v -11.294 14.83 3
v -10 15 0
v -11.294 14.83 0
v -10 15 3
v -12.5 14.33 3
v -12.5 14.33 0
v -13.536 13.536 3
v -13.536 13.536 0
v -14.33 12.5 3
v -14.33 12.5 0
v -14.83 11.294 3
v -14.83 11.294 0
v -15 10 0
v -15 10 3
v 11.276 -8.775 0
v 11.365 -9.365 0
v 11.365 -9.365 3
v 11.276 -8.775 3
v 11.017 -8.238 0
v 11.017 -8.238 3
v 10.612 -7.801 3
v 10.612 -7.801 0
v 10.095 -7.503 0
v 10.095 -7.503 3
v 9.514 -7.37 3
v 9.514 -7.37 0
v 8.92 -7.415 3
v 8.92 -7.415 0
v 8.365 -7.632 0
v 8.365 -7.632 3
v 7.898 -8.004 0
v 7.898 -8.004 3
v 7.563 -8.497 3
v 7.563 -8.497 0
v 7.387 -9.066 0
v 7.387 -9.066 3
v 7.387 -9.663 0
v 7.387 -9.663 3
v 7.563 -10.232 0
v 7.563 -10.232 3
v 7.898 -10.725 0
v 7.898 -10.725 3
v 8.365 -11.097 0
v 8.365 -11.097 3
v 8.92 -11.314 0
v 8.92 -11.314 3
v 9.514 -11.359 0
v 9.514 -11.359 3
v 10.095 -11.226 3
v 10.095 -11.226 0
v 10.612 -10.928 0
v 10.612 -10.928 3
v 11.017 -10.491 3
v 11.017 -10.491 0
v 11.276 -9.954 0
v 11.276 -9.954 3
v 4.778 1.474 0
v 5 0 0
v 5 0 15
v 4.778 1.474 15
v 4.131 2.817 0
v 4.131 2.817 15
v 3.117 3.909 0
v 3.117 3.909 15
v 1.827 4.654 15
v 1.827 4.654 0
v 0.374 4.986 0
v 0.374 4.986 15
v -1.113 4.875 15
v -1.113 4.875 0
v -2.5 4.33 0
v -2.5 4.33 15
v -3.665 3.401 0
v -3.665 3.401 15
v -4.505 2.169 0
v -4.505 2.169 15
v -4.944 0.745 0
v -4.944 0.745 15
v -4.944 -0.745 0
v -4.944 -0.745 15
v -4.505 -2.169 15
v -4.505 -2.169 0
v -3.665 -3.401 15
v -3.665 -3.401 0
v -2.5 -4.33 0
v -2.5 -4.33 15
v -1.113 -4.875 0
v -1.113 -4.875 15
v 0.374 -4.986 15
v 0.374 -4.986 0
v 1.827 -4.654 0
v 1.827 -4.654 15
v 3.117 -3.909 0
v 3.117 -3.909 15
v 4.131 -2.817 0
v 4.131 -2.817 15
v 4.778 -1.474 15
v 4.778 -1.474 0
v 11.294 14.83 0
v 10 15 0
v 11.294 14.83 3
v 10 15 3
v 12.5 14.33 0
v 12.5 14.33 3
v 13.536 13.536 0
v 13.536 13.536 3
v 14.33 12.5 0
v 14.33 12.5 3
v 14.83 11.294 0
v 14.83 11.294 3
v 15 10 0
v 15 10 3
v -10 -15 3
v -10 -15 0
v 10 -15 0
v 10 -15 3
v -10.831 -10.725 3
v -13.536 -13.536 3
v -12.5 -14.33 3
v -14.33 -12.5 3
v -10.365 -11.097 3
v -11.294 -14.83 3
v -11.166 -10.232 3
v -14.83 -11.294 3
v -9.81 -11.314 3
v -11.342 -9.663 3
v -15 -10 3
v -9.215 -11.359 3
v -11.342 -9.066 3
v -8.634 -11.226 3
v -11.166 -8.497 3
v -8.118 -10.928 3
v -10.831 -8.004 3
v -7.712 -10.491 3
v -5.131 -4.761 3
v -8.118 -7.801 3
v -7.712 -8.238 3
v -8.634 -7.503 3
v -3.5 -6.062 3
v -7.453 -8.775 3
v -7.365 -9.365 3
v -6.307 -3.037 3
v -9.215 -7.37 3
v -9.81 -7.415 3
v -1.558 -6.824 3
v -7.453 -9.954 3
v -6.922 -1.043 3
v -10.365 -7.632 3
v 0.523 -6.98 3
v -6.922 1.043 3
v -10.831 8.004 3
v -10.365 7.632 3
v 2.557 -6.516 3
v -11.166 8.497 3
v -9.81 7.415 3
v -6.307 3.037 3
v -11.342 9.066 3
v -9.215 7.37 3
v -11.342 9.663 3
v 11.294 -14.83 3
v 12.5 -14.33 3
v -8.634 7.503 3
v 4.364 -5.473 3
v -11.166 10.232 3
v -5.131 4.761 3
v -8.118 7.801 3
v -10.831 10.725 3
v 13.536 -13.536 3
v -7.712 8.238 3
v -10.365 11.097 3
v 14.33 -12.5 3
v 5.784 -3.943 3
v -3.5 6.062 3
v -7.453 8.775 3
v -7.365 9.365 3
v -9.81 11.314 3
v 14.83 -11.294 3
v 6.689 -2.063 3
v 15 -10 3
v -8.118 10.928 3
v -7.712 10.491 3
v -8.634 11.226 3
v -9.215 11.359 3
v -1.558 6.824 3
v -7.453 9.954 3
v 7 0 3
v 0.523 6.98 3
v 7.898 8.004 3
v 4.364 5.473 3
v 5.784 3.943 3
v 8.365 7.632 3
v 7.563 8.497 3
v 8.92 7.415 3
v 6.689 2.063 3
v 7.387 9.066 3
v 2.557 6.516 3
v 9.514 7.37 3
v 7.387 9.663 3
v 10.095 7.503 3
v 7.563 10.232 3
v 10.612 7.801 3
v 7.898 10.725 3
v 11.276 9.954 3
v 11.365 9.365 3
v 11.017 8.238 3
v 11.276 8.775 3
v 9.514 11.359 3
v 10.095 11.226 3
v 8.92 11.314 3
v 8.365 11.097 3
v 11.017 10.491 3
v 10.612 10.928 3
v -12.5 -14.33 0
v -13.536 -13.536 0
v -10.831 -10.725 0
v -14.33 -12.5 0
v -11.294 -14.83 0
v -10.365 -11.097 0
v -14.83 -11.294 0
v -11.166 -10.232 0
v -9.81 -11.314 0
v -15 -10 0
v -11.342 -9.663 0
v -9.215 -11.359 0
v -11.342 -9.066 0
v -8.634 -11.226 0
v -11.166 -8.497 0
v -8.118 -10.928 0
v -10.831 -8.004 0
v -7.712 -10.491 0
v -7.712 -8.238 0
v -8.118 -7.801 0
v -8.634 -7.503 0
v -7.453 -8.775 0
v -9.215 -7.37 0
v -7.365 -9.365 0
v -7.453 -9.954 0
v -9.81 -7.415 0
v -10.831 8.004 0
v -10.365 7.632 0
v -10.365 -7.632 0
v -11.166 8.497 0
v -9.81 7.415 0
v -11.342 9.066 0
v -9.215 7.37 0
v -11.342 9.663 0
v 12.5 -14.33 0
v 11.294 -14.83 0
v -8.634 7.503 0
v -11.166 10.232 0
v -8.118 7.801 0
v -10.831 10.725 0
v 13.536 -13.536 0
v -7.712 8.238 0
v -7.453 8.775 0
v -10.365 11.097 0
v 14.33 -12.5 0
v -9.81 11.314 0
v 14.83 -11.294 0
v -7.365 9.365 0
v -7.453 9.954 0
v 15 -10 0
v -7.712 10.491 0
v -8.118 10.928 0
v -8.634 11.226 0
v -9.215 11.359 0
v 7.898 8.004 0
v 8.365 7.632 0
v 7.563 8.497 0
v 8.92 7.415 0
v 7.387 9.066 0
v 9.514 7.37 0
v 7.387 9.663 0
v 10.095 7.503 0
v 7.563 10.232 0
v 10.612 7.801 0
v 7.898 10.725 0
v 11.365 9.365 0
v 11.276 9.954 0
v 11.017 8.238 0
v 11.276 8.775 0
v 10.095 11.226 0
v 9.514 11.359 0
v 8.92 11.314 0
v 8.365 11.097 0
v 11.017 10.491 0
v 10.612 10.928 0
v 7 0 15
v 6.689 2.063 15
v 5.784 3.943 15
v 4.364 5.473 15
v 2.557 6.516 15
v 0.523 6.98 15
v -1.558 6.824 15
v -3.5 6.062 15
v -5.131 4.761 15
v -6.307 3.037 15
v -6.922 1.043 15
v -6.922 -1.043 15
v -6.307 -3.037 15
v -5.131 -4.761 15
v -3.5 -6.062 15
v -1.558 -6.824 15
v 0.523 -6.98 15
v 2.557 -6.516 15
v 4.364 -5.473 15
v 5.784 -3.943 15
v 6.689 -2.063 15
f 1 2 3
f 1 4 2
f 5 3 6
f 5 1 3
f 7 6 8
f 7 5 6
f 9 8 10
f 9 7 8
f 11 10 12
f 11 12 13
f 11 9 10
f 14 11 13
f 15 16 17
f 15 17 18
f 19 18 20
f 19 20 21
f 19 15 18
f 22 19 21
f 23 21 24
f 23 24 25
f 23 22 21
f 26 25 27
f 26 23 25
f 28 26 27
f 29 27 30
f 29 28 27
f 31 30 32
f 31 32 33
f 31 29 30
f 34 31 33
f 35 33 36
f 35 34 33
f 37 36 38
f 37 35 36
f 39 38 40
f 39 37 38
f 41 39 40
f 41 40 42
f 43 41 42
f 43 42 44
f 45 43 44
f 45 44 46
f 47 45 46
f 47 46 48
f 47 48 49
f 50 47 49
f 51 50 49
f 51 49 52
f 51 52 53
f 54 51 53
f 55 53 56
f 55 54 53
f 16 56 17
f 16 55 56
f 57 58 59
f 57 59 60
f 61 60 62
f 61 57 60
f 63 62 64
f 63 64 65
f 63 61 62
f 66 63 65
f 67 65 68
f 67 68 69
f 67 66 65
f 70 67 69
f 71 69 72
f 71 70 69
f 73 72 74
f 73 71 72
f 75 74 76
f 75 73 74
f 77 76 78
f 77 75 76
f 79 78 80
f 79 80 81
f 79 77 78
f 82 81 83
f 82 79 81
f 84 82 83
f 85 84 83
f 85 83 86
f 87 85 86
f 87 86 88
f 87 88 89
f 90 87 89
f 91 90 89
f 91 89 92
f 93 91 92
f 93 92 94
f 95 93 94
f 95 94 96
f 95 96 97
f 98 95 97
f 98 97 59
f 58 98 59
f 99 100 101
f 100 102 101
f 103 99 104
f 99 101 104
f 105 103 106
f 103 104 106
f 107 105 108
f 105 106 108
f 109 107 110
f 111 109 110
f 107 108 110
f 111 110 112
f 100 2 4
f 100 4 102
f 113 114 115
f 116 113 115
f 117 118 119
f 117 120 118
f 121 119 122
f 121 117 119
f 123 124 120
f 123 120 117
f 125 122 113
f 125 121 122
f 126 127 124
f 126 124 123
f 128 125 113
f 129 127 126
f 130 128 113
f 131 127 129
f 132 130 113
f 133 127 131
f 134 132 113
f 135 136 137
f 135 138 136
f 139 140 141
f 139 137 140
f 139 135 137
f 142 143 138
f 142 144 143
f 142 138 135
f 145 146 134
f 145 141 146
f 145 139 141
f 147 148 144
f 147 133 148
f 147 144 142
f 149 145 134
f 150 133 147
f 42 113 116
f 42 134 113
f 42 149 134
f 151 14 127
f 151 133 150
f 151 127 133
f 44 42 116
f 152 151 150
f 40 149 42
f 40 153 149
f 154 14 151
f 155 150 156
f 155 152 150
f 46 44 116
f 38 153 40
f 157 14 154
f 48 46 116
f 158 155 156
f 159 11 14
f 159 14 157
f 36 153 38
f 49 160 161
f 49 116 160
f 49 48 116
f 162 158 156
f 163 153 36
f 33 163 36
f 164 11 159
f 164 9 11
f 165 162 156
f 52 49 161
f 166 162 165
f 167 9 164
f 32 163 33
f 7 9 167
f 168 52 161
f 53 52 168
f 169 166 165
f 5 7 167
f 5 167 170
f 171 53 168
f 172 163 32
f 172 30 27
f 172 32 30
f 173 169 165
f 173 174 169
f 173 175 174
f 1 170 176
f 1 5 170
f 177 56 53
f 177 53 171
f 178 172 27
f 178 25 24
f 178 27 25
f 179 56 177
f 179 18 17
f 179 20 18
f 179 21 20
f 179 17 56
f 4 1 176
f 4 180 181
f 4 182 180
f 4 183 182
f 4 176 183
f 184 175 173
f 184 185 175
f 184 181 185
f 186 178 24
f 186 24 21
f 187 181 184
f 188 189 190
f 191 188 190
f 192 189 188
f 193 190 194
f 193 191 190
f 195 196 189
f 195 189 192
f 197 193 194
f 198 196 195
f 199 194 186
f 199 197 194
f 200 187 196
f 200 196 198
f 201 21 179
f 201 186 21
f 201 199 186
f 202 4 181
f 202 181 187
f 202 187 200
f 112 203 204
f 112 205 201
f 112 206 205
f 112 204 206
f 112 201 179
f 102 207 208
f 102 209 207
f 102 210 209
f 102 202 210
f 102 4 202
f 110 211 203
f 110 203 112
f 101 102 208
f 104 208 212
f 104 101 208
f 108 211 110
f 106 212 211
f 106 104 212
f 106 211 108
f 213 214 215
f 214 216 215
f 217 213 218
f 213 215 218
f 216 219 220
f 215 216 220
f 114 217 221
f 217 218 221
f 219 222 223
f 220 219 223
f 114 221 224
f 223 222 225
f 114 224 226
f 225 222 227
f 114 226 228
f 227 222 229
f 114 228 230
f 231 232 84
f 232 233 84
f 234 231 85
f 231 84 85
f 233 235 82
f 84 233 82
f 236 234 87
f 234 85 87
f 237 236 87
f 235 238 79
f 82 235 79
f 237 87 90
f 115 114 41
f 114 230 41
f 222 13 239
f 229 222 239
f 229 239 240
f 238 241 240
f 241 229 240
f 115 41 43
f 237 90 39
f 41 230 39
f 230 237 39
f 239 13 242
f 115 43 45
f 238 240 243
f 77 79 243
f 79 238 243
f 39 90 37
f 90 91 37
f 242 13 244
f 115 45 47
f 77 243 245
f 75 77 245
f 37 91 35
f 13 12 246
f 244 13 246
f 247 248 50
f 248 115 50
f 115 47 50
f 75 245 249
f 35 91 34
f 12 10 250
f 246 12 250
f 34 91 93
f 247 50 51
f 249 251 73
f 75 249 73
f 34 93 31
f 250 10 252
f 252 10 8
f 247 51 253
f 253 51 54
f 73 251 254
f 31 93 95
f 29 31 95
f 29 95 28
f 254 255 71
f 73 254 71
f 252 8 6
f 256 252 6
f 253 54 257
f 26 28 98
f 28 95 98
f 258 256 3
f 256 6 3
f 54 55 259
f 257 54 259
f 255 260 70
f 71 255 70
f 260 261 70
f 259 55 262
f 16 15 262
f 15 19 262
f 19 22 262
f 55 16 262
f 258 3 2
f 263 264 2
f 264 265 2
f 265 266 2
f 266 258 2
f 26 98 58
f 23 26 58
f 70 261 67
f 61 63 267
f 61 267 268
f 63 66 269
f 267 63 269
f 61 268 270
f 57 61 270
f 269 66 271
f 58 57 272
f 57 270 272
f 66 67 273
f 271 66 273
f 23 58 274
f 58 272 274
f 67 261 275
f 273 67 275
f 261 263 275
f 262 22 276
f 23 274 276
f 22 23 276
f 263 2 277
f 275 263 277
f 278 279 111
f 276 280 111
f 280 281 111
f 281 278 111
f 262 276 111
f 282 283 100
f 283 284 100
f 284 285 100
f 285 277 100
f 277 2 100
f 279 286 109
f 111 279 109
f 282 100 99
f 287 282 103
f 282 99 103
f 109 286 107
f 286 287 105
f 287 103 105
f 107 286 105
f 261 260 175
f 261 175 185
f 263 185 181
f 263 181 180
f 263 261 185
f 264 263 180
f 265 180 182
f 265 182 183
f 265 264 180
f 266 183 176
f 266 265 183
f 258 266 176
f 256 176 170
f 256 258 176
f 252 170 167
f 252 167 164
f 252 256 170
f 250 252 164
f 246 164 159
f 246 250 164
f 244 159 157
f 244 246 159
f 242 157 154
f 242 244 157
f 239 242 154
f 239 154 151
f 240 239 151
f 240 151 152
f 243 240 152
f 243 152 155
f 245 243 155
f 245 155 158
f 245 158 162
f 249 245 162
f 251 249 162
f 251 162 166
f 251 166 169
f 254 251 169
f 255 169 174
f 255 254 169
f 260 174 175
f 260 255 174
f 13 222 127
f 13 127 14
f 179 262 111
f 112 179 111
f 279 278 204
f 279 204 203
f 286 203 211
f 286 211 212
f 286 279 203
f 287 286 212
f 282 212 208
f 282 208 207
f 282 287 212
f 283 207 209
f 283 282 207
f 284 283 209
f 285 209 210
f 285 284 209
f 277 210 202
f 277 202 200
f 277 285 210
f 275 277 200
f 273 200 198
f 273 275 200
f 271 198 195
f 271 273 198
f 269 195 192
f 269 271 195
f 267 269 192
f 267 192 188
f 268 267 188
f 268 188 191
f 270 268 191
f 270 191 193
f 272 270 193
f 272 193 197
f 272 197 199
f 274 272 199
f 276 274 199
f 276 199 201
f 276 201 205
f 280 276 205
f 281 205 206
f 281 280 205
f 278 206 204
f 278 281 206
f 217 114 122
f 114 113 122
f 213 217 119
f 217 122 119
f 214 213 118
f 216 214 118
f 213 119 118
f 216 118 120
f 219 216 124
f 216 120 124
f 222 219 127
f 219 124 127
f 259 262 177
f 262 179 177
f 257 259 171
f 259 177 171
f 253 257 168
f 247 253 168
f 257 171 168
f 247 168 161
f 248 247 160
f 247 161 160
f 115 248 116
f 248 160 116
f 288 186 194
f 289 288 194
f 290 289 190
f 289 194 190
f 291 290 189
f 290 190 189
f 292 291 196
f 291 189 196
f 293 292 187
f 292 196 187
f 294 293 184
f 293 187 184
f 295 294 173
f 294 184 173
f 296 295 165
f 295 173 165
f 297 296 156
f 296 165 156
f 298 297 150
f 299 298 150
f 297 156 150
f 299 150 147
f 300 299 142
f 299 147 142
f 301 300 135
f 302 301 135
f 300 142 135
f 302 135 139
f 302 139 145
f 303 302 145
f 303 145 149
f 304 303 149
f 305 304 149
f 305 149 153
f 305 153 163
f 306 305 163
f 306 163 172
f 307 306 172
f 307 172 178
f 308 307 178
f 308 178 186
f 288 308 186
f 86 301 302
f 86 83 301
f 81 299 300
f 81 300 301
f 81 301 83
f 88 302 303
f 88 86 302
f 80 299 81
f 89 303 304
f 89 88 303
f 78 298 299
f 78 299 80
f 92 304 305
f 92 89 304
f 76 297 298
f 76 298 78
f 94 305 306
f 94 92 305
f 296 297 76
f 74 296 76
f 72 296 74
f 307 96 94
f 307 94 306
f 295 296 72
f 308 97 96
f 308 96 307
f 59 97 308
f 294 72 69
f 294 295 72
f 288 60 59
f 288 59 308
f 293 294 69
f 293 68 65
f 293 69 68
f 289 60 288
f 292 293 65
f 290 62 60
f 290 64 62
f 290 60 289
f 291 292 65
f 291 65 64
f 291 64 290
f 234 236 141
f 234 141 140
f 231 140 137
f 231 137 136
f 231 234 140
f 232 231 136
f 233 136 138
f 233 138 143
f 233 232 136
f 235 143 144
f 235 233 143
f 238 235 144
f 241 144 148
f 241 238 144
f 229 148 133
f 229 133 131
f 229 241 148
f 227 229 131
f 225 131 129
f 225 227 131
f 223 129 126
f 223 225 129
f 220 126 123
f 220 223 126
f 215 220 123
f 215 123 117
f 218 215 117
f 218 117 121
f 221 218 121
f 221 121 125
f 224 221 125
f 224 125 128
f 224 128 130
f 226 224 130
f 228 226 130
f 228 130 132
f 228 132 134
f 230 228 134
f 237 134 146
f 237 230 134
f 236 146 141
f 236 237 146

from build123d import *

# Parameters (mm, degrees)
F0_W     = 30
F0_H     = 30
F0_R     = 2
F0_R_2   = 7
F0_R_3   = 5
F1_DEPTH = 3
F2_DEPTH = 15
F3_R     = 5


with BuildPart() as f1:
    # F0 (on Top) → F1 (new body)
    with BuildSketch(Plane.XY):
        Rectangle(F0_W, F0_H)
        with Locations((-9.364547, -9.364547)):
            Circle(F0_R, mode=Mode.SUBTRACT)
        with Locations((9.364547, -9.364547)):
            Circle(F0_R, mode=Mode.SUBTRACT)
        with Locations((-9.364547, 9.364547)):
            Circle(F0_R, mode=Mode.SUBTRACT)
        Circle(F0_R_2, mode=Mode.SUBTRACT)
        with Locations((9.364547, 9.364547)):
            Circle(F0_R, mode=Mode.SUBTRACT)
        Circle(F0_R_2)
        Circle(F0_R_3, mode=Mode.SUBTRACT)
    extrude(amount=F1_DEPTH)

    # F0 (on Top) → F2 (join)
    with BuildSketch(Plane.XY):
        Circle(F0_R_2)
        Circle(F0_R_3, mode=Mode.SUBTRACT)
    extrude(amount=F2_DEPTH)

    # F3
    f3_edges = [f1.edges().sort_by_distance(p)[0] for p in [
        (-15, 15, 1.5),
        (15, 15, 1.5),
        (-15, -15, 1.5),
        (15, -15, 1.5),
    ]]
    fillet(f3_edges, radius=F3_R)


solid = f1.part
